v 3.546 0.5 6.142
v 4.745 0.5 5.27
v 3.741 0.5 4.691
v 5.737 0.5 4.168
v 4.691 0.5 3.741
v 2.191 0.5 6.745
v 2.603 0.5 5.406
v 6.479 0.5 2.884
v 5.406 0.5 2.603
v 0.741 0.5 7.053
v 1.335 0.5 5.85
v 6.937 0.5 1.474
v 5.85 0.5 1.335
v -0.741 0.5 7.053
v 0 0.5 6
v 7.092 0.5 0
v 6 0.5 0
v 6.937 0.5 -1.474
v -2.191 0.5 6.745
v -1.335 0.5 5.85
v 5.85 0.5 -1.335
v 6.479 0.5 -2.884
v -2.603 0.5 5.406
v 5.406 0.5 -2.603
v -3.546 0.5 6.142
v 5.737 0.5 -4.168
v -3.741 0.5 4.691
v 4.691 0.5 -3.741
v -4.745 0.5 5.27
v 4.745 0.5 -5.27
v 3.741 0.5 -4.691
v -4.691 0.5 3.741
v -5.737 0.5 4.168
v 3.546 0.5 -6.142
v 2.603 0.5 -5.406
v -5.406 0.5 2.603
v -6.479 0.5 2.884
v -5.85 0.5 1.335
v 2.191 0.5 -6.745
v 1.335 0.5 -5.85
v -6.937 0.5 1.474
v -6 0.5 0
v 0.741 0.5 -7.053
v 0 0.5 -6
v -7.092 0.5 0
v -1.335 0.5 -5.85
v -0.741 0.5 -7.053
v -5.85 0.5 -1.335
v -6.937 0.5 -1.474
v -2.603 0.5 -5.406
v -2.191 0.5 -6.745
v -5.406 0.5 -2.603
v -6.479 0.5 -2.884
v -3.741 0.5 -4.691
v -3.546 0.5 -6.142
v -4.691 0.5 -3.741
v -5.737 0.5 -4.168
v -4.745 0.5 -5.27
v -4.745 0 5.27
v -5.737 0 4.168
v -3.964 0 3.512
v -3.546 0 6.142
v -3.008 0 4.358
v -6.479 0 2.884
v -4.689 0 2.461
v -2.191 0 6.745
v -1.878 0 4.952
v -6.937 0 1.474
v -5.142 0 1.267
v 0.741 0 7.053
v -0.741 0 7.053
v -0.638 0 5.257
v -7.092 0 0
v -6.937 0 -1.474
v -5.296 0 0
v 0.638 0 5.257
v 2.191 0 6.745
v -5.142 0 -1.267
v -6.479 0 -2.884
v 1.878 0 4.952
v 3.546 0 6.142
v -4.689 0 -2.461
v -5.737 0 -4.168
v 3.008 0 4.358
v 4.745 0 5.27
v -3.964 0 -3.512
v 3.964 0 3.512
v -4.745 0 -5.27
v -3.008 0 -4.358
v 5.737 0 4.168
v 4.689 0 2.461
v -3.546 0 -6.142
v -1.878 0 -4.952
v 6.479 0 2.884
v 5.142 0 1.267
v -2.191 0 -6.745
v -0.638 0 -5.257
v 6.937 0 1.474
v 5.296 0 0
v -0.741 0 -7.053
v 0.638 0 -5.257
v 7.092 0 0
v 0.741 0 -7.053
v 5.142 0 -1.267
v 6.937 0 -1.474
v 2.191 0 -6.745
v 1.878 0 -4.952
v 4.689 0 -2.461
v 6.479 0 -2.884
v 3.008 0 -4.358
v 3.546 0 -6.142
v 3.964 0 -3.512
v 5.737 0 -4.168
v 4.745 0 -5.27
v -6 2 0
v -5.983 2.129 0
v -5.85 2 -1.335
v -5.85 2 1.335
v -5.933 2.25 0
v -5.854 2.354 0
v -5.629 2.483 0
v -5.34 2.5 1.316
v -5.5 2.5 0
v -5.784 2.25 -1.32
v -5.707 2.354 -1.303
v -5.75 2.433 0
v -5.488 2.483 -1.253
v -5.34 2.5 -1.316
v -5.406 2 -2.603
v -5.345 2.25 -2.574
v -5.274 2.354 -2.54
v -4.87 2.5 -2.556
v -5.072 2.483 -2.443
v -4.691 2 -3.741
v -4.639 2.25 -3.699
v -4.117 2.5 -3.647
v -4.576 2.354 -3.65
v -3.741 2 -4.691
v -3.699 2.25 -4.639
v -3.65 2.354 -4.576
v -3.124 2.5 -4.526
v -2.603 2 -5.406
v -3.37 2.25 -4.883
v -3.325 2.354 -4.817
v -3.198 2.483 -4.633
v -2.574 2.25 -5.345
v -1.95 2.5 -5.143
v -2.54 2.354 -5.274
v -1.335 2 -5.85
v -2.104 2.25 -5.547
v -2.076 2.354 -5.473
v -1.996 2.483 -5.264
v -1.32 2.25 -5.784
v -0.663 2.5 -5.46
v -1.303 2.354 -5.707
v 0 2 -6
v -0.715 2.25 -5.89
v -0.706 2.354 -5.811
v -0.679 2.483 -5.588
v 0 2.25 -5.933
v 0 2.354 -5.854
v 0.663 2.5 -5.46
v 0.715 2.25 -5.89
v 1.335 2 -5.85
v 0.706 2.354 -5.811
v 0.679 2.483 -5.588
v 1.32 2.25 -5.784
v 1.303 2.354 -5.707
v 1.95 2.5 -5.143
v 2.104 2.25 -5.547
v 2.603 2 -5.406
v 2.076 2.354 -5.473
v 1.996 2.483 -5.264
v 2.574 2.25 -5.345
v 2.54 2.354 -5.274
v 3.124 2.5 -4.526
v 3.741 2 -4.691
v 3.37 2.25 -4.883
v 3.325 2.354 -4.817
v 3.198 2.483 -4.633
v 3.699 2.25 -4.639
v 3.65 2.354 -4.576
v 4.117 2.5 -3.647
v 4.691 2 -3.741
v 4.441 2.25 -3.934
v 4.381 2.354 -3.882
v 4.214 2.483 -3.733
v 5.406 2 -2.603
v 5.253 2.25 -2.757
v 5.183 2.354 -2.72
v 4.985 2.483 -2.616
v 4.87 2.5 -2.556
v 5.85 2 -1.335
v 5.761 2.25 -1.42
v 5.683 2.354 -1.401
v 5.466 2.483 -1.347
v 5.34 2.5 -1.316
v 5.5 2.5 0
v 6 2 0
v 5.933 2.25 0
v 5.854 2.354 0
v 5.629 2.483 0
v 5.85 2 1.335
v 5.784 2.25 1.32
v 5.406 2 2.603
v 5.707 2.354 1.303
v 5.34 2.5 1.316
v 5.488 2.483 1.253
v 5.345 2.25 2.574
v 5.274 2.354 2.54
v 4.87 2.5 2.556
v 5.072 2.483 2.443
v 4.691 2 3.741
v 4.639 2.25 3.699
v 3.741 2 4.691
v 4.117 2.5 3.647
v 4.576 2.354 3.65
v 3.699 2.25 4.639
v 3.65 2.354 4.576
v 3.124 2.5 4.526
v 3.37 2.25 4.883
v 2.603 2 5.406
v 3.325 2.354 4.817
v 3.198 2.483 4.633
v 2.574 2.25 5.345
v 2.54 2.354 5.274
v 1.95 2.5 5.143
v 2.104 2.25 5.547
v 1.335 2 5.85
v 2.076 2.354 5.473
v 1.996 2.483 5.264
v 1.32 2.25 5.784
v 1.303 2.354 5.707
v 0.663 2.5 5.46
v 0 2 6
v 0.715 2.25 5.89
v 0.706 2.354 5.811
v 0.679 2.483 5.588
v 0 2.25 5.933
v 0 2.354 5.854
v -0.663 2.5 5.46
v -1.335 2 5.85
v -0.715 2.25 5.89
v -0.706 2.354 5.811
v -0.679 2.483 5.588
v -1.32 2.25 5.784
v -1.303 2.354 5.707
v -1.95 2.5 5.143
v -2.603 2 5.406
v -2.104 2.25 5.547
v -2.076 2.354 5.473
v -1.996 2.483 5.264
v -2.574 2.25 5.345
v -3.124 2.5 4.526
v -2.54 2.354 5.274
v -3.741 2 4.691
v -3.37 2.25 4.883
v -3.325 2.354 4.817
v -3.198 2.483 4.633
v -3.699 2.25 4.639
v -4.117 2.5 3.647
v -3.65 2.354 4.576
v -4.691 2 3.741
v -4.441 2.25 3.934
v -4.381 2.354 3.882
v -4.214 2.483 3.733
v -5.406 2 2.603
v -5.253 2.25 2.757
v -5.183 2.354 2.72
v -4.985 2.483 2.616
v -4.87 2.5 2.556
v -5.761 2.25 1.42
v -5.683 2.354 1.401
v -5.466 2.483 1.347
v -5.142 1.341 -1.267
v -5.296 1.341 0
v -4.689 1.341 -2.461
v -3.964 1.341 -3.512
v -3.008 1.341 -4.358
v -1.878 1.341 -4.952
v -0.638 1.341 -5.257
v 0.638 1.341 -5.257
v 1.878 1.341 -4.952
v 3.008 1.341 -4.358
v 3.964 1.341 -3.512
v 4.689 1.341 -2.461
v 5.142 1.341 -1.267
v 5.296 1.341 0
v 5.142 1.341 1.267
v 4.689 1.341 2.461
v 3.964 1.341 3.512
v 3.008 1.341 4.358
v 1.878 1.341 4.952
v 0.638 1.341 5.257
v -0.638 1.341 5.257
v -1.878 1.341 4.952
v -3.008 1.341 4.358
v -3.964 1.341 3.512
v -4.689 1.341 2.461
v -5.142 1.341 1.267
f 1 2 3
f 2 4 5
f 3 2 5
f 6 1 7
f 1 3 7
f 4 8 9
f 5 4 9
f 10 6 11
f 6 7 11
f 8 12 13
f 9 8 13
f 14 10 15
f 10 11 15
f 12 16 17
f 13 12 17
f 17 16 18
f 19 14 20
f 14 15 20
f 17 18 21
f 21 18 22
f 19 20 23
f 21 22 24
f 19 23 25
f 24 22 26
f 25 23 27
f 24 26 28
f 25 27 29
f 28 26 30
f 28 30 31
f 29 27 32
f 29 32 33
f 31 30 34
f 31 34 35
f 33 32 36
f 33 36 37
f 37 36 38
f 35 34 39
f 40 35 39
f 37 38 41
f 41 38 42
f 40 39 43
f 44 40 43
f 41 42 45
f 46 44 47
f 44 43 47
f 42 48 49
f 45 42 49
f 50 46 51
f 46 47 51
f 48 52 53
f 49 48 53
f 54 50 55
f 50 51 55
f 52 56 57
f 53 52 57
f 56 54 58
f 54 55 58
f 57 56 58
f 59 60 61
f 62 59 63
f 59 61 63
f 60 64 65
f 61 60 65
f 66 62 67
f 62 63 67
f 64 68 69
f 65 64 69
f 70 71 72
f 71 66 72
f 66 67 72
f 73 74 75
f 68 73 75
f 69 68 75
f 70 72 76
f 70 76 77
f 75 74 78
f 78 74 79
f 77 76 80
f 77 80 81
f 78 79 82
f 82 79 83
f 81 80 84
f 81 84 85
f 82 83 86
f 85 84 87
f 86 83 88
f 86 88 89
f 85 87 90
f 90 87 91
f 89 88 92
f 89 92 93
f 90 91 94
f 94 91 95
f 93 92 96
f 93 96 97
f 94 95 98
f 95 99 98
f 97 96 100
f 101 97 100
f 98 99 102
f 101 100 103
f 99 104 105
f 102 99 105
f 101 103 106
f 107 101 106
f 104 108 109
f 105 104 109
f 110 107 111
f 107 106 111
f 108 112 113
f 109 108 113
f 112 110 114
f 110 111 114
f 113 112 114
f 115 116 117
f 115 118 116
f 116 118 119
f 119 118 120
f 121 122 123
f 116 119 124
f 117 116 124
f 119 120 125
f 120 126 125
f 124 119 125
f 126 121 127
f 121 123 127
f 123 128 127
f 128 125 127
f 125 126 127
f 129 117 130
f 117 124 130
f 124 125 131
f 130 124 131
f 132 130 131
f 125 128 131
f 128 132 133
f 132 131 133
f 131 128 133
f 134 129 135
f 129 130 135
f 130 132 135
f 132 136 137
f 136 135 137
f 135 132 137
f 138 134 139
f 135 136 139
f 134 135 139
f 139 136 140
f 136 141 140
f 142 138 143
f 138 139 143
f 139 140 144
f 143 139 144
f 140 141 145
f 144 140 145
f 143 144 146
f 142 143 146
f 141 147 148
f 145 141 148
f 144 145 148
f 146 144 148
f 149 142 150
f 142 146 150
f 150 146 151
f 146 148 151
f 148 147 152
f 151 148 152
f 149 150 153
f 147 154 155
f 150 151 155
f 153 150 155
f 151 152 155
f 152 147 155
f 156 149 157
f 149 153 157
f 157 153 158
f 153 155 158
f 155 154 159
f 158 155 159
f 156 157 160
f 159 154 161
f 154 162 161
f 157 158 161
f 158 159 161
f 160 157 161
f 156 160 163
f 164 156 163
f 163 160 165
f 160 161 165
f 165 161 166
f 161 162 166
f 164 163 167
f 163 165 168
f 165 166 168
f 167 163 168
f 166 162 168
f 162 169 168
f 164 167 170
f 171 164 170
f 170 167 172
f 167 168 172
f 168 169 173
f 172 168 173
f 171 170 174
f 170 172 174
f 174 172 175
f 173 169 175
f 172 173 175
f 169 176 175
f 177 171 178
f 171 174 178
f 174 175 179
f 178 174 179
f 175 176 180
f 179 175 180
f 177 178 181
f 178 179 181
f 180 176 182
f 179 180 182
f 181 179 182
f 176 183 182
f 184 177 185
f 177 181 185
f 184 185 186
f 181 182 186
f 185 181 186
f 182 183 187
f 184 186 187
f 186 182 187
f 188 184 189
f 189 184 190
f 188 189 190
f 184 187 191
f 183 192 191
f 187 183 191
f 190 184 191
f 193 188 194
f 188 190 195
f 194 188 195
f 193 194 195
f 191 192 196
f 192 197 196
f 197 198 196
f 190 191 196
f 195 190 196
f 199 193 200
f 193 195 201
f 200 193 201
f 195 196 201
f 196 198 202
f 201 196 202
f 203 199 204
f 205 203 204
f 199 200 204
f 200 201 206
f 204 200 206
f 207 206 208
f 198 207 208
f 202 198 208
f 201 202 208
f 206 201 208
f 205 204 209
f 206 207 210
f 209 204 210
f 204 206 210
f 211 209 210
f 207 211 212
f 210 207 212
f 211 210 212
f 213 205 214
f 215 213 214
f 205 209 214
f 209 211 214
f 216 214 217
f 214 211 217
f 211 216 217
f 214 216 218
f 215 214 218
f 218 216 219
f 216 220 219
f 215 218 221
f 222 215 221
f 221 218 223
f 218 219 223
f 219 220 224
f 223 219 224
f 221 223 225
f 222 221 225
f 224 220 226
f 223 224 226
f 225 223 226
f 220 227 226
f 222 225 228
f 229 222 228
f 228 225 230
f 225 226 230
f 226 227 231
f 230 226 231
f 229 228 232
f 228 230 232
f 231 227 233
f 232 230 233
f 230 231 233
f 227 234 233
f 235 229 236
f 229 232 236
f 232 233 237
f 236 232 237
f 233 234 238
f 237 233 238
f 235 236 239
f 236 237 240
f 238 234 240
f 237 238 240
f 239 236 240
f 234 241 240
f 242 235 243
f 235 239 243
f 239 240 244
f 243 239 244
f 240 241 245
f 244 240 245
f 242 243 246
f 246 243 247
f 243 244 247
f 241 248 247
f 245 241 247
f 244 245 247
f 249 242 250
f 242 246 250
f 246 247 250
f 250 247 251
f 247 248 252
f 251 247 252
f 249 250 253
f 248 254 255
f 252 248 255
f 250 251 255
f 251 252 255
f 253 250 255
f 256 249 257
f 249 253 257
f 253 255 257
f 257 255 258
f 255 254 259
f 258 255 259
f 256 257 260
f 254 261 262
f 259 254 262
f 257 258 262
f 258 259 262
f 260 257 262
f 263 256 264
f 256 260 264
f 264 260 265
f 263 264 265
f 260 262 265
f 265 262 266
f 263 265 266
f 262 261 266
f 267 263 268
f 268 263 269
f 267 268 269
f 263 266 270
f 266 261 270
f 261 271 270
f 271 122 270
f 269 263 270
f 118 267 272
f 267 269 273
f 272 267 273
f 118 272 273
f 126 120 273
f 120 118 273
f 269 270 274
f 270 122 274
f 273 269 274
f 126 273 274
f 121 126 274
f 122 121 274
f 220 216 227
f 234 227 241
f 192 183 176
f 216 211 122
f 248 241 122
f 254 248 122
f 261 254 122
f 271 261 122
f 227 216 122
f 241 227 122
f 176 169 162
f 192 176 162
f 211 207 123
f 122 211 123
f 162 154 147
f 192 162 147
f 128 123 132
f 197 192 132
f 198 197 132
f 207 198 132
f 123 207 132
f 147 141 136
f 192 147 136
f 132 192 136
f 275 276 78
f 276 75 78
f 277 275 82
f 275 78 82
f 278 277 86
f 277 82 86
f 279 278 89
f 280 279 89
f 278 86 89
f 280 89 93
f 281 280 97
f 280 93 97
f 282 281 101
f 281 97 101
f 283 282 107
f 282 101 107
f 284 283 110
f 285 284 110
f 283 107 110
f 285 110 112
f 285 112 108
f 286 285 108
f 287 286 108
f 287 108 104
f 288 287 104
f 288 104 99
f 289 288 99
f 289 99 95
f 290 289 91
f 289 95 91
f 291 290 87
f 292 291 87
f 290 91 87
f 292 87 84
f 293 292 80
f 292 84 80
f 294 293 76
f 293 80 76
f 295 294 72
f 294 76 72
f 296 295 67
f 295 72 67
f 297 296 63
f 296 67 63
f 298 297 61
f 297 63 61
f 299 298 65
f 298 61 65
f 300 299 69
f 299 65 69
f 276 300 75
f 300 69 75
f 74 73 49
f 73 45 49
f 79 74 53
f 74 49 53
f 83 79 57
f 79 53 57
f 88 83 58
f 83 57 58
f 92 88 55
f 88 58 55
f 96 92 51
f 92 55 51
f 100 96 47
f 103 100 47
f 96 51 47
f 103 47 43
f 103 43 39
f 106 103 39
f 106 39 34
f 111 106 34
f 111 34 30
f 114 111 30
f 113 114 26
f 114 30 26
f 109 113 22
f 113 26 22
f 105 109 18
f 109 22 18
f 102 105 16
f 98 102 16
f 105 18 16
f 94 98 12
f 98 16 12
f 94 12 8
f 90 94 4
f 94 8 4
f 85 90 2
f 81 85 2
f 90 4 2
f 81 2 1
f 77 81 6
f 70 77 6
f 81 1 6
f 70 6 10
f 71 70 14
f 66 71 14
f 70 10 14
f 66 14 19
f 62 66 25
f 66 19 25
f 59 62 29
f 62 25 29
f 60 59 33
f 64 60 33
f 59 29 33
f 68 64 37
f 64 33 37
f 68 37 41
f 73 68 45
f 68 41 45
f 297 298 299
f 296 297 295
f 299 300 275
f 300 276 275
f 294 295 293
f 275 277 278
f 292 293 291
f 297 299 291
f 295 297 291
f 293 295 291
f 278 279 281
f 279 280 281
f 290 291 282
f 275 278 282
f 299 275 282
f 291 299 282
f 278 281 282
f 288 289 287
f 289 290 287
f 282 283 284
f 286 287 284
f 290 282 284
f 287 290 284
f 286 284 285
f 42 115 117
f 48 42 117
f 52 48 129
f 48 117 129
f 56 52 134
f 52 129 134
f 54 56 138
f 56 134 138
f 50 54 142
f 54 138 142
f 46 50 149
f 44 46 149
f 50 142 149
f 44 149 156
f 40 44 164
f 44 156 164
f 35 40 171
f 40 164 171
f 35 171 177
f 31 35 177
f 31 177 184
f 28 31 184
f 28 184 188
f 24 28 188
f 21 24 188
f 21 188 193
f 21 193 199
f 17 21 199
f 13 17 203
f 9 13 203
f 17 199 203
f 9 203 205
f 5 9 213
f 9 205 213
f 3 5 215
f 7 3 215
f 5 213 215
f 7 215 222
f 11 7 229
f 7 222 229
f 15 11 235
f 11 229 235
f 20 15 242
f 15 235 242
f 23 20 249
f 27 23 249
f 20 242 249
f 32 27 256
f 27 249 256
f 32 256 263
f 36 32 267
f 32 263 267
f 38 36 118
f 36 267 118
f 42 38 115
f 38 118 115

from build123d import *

# Parameters (mm, degrees)
FILLET_1_R = 0.5


with BuildPart() as part:
    # Эскиз1 → Повернуть1 (revolve)
    with BuildSketch(Plane.XY):
        Polygon((-5.295963856, 0), (-7.091803279, 0), (-7.091803279, 0.5), (-6, 0.5), (-6, 2.5), (0, 2.5), (0, 1.340599242), (-5.295963856, 1.340599242), align=None)
    revolve(axis=Axis((0, 2.5, 0), (0, -1, 0)))

    # Скругление1
    fillet_1_edges = [part.edges().sort_by_distance(p)[0] for p in [
        (6, 2.5, 0),
    ]]
    fillet(fillet_1_edges, radius=FILLET_1_R)


solid = part.part
